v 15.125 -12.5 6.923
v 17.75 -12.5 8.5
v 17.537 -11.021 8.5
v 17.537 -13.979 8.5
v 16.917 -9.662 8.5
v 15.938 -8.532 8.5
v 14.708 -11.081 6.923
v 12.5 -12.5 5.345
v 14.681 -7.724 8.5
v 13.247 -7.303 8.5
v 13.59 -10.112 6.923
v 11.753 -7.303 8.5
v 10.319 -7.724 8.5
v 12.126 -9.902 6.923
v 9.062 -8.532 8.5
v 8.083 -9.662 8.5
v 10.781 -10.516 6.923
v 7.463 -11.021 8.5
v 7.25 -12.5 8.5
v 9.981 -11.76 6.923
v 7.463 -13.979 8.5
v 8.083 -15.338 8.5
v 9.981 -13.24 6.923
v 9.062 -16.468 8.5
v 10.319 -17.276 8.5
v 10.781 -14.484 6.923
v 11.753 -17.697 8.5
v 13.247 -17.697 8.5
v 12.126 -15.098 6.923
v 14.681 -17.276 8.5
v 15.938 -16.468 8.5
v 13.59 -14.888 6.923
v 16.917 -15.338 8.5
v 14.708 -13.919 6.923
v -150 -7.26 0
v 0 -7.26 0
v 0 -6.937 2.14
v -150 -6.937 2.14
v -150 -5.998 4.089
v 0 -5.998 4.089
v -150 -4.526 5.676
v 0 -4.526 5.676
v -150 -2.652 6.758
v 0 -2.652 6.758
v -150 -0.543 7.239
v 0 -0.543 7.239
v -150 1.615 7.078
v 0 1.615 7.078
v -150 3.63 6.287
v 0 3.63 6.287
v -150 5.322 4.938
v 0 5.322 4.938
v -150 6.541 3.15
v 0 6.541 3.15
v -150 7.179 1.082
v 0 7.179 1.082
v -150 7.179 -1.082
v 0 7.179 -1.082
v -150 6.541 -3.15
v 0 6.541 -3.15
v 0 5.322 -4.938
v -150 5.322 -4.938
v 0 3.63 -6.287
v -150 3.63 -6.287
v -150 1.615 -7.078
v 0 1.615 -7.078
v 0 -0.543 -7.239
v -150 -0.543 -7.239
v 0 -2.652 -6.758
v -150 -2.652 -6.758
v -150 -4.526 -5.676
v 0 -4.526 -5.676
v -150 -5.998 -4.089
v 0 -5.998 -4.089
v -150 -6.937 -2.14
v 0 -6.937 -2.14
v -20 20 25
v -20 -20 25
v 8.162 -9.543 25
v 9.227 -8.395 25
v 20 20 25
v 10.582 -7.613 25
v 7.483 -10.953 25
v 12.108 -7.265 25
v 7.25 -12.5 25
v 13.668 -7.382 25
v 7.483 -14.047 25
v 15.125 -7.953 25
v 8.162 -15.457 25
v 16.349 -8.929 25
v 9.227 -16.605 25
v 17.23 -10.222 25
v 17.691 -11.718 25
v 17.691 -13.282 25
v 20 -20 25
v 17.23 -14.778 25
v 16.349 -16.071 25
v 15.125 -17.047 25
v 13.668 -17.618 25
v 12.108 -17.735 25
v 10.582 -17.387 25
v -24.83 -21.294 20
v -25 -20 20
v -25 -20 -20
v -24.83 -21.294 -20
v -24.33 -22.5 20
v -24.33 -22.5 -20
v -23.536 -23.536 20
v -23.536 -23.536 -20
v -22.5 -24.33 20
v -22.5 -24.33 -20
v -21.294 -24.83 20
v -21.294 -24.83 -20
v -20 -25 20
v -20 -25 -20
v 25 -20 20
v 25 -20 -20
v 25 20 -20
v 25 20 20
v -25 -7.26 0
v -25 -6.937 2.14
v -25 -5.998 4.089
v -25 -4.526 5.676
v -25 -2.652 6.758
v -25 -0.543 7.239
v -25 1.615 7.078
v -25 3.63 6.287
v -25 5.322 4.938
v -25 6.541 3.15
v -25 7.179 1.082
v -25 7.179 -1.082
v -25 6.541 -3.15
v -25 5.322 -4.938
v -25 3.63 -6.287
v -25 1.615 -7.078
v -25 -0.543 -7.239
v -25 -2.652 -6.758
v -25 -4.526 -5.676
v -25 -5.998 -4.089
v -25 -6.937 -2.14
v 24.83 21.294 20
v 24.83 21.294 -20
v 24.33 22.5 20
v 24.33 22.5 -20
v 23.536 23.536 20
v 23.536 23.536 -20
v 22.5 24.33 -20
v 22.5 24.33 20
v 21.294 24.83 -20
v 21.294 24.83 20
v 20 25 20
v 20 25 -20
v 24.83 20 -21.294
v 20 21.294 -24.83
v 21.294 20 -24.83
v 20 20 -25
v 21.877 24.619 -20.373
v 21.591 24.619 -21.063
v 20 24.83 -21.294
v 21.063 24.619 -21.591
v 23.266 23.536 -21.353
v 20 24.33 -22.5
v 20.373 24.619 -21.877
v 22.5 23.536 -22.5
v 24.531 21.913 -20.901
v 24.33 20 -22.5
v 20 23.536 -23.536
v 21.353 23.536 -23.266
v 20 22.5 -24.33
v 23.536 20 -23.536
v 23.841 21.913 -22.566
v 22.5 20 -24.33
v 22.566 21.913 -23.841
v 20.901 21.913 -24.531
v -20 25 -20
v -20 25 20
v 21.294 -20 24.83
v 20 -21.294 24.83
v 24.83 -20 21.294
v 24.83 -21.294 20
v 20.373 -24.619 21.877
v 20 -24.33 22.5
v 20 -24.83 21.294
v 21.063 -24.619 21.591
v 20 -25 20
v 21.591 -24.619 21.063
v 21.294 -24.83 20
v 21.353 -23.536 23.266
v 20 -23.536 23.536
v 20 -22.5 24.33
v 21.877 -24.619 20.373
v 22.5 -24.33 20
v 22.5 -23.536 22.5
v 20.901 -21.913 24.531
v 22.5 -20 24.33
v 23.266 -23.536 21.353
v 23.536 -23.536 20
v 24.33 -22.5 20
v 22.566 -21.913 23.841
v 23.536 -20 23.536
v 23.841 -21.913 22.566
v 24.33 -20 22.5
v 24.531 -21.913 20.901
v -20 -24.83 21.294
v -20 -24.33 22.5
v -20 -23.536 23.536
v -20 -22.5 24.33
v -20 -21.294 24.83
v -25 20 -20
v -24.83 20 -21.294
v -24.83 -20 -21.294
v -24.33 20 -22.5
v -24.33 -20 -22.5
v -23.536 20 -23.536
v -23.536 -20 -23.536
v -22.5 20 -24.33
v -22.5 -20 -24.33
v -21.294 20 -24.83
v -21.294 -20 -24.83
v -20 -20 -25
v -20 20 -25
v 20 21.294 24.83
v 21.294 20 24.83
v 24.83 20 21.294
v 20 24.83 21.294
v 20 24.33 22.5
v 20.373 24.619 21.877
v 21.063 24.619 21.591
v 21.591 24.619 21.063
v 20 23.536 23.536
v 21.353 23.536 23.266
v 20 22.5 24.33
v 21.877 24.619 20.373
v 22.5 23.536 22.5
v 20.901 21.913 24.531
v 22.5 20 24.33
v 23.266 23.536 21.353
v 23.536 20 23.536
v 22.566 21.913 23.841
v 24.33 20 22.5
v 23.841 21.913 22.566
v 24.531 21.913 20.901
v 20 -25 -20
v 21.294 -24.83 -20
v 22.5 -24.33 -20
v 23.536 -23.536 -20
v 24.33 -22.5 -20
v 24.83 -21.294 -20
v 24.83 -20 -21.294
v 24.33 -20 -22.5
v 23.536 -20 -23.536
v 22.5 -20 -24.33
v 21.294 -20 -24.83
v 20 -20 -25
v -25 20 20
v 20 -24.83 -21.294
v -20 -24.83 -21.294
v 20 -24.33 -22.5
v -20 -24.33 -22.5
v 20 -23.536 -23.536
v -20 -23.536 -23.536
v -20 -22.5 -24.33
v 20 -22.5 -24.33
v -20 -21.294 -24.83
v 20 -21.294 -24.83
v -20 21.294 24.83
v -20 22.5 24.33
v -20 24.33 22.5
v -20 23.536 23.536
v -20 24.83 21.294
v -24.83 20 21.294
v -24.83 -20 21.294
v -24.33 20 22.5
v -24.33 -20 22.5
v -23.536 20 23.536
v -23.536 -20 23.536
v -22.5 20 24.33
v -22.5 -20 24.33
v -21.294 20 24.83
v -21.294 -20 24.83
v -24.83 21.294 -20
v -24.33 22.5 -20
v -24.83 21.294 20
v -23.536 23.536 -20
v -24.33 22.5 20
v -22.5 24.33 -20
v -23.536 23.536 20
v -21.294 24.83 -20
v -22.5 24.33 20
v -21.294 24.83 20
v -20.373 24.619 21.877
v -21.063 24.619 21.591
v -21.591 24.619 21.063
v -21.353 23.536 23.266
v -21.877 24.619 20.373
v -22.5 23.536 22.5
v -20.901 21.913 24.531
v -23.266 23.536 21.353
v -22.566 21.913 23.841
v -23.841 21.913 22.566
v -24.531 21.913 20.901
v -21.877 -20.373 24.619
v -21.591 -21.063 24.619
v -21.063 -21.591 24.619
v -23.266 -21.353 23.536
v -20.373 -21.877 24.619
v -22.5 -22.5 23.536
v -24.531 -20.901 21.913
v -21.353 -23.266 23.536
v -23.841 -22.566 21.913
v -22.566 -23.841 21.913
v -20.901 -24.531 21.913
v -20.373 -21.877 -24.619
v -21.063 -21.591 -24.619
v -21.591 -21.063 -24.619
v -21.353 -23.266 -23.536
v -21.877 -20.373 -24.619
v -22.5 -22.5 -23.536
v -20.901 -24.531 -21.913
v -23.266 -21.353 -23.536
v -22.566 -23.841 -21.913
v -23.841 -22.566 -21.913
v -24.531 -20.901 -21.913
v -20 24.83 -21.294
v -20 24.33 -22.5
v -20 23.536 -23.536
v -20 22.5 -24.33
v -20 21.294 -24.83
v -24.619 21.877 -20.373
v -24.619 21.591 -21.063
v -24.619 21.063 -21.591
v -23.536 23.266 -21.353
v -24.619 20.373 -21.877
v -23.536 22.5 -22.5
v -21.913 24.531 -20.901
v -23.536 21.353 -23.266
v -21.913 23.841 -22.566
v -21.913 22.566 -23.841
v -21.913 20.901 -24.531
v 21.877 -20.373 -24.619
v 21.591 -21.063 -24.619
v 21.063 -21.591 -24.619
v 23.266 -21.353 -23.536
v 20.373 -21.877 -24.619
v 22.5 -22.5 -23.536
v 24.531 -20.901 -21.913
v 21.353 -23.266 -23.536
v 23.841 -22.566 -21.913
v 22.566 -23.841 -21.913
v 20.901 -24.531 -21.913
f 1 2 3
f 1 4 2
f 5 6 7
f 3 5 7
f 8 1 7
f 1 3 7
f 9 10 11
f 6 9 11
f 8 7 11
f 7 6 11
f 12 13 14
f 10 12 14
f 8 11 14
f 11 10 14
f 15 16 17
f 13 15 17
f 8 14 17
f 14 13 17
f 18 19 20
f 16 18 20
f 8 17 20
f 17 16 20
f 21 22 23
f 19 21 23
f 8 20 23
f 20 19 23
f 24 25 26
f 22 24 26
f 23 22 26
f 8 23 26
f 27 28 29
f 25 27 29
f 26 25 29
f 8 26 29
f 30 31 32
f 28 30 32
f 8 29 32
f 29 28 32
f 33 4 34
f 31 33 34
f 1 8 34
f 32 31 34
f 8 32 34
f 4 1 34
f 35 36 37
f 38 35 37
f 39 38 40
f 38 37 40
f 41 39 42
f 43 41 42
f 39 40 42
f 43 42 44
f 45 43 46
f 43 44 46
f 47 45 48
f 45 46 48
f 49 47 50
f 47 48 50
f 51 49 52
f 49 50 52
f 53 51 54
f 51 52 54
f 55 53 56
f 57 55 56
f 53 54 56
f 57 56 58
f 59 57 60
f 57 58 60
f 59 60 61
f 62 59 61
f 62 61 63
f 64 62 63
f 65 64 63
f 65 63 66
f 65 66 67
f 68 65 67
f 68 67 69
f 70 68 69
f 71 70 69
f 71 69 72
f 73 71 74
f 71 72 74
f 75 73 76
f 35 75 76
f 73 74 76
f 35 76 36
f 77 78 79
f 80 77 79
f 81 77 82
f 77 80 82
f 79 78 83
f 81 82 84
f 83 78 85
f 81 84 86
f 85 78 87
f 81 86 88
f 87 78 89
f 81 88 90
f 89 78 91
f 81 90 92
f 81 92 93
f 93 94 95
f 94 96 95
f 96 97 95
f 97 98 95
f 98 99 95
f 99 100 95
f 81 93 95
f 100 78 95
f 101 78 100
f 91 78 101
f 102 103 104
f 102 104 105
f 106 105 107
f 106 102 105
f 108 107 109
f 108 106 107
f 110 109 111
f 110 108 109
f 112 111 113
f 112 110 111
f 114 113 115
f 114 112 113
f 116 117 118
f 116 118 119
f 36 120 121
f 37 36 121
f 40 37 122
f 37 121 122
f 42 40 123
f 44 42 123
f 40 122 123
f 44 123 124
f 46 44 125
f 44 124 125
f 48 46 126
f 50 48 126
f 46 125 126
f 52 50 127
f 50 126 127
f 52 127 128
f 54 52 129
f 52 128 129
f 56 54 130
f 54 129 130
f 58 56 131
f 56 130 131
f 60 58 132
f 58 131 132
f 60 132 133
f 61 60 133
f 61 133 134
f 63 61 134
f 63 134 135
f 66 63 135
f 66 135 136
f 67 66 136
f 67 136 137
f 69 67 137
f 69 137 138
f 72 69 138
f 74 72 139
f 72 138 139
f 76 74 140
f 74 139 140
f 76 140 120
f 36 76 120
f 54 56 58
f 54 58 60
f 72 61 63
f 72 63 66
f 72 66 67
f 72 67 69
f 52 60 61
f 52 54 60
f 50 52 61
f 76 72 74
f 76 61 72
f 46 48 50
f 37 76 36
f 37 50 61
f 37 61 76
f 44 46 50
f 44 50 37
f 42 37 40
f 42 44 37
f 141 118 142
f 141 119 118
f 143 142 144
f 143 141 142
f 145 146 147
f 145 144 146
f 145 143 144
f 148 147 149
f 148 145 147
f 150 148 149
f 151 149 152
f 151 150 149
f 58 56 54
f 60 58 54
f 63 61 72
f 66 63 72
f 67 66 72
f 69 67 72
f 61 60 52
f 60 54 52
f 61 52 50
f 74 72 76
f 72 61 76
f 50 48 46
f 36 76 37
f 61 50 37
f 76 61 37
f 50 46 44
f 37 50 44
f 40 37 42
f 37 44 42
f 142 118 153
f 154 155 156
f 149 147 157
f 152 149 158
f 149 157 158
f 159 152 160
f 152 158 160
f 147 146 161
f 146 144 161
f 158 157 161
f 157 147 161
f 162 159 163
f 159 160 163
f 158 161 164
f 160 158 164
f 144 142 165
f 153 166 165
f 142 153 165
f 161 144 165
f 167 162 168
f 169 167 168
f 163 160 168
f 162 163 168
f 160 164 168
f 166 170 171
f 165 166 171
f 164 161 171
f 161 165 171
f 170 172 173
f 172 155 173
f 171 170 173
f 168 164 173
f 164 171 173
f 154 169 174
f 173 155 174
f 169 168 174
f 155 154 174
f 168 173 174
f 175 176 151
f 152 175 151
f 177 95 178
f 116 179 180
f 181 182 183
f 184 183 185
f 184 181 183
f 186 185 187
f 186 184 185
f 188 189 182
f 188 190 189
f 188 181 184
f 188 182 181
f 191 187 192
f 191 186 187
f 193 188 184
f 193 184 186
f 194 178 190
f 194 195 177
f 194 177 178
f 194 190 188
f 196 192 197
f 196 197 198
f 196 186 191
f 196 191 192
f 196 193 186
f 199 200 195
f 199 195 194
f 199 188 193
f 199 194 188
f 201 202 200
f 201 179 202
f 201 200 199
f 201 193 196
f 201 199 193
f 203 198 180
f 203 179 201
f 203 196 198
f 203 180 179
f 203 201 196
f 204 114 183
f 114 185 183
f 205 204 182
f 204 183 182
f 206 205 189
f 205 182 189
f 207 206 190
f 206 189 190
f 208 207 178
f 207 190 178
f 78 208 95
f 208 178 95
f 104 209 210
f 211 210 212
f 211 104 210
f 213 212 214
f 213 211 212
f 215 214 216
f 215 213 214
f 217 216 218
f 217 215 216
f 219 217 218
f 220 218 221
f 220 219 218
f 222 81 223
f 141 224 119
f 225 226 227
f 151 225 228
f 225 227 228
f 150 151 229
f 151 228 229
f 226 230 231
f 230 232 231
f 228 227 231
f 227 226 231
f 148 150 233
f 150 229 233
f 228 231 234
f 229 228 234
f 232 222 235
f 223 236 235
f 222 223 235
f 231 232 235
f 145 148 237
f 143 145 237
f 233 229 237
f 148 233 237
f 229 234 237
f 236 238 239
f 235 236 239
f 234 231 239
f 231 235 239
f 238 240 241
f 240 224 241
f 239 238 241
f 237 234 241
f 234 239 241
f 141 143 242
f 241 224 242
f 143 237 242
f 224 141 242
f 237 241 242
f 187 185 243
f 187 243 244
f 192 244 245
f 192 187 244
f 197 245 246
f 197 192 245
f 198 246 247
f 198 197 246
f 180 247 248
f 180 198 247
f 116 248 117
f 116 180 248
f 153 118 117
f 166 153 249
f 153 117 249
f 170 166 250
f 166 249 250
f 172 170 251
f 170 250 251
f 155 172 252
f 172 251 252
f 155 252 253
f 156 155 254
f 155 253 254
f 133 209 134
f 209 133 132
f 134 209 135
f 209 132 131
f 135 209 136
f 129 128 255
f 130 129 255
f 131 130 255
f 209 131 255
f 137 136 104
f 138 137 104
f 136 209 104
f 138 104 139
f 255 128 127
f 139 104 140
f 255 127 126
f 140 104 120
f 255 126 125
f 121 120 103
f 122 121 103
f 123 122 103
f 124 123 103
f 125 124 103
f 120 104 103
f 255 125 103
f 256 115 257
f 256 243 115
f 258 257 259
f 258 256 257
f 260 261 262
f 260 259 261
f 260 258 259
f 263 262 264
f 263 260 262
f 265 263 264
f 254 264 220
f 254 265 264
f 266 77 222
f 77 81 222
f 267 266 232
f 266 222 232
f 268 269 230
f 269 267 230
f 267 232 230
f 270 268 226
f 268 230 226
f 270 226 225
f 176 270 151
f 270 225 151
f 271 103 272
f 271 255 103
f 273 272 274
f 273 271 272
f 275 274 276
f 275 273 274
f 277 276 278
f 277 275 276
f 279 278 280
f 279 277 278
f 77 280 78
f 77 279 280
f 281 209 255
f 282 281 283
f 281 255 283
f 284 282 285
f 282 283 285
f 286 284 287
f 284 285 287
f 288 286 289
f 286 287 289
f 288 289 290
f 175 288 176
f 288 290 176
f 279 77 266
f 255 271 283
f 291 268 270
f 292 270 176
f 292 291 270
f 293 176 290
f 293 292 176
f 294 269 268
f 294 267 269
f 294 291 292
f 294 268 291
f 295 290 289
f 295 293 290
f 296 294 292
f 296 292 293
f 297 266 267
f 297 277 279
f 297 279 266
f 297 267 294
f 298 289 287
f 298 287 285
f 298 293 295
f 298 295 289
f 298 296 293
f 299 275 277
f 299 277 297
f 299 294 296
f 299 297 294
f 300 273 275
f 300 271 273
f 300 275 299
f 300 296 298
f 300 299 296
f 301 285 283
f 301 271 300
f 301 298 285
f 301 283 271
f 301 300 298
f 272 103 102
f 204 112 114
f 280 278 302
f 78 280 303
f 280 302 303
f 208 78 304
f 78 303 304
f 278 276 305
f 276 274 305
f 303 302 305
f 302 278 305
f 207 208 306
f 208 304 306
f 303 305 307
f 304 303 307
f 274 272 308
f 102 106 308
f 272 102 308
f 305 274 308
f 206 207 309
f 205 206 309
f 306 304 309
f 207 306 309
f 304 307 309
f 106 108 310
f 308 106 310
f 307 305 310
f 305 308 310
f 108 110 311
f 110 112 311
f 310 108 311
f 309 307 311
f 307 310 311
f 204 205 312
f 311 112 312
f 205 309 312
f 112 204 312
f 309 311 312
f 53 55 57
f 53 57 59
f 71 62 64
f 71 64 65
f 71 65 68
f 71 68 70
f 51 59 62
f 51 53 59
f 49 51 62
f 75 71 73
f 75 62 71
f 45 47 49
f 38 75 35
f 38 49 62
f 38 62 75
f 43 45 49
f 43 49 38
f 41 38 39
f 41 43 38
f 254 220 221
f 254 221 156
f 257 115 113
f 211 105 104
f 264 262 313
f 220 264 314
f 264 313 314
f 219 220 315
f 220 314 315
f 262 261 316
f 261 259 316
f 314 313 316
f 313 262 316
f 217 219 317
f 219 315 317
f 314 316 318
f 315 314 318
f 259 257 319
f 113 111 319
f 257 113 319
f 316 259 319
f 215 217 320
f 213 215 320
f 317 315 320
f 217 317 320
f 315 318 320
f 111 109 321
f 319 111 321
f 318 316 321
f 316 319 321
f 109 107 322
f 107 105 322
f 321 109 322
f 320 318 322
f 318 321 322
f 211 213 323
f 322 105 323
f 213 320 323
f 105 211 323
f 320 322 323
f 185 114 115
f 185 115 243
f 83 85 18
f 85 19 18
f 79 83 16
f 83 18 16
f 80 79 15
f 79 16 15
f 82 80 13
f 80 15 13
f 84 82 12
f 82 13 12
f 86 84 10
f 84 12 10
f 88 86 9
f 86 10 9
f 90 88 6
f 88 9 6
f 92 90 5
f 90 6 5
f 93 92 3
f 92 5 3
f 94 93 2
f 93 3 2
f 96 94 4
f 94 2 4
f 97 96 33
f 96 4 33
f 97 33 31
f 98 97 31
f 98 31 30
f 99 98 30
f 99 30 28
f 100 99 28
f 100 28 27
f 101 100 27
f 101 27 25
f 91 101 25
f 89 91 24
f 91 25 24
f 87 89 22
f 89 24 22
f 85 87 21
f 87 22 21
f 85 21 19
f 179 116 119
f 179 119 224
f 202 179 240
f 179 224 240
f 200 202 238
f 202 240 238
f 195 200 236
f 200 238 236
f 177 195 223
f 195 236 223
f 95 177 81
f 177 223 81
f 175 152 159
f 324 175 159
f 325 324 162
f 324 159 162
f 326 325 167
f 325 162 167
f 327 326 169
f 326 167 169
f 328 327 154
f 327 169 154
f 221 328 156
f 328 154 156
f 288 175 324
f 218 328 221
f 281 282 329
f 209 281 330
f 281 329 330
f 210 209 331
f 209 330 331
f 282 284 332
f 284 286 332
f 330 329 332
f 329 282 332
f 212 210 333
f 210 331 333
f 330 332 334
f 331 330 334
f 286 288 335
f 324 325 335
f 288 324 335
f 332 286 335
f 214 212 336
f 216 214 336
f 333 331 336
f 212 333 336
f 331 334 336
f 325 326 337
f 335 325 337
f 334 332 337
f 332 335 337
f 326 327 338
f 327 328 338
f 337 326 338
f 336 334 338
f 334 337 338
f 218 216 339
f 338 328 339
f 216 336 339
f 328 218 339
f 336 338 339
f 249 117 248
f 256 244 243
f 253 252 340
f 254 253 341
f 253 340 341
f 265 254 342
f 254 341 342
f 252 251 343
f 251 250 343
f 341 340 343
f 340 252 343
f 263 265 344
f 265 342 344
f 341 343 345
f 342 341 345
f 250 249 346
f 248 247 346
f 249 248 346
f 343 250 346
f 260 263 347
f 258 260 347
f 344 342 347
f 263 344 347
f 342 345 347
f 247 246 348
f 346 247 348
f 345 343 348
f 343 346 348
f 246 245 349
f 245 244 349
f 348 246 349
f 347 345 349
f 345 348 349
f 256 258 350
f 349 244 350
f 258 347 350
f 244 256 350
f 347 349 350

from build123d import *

# Parameters (mm, degrees)
F0_W     = 50
F0_H     = 50
F1_DEPTH = 25
F2_R     = 5
F4_D     = 10.5
F4_DEPTH = 16.5
F4_TIP   = 3.1545182499
F5_R     = 7.2596077851
F6_DEPTH = 25
F7_DEPTH = 150


with BuildPart() as f1:
    # F0 (on Front) → F1 (new body, symmetric)
    with BuildSketch(Plane.XZ):
        Rectangle(F0_W, F0_H)
    extrude(amount=F1_DEPTH, both=True)

    # F2
    f2_edges = [f1.edges().sort_by_distance(p)[0] for p in [
        (-25, -25, 0),
        (-25, 0, 25),
        (25, 0, 25),
        (0, 25, 25),
        (0, -25, 25),
        (25, -25, 0),
        (25, 0, -25),
        (0, -25, -25),
        (25, 25, 0),
        (0, 25, -25),
        (-25, 25, 0),
        (-25, 0, -25),
    ]]
    fillet(f2_edges, radius=F2_R)

    # F4
    with Locations(Plane.XY.offset(25)):
        with Locations((12.5, -12.5)):
            Hole(F4_D / 2, depth=F4_DEPTH)
            with Locations((0, 0, -(F4_DEPTH + F4_TIP / 2))):  # 118° drill point
                Cone(0, F4_D / 2, F4_TIP, mode=Mode.SUBTRACT)

    # F5 (on face) → F6 (cut)
    with BuildSketch(Plane(origin=(-25, 0, 0), x_dir=(0, -1, 0), z_dir=(-1, 0, 0))):
        Circle(F5_R)
    extrude(amount=-F6_DEPTH, mode=Mode.SUBTRACT)


with BuildPart() as f7:
    # F7 (new): a face of the model
    f7_faces = [f1.part.faces().sort_by_distance(p)[0] for p in [
        (0, 0, 0),
    ]]
    extrude(f7_faces, amount=F7_DEPTH)


solid = Compound([f1.part, f7.part])
